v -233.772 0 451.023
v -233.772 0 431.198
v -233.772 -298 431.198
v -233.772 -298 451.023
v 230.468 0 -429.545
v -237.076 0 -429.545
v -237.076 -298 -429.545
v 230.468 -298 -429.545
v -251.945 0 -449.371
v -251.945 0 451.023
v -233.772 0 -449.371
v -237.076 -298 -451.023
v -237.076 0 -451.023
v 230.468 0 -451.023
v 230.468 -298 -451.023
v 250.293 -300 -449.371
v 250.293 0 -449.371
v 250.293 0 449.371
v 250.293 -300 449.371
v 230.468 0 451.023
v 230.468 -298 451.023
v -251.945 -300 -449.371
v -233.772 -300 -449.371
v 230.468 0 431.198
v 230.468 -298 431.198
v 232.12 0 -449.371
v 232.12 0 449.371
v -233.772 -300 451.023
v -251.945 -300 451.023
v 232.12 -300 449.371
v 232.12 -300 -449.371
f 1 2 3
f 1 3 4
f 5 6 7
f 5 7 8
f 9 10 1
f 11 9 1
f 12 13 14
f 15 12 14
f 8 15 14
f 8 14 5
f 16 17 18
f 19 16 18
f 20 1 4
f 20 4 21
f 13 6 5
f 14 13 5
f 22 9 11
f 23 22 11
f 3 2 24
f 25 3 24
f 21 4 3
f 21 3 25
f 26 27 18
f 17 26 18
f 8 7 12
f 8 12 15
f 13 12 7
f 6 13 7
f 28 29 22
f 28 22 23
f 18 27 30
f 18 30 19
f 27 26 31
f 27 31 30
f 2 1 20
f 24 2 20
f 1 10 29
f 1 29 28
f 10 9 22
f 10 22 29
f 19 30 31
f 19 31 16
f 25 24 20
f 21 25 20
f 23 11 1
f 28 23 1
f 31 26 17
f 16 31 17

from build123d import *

# Parameters (mm, degrees)
F0_W     = 18.173083
F0_H     = 900.393337
F0_W_2   = 18.173069
F0_H_2   = 898.741246
F1_DEPTH = 300
F2_W     = 464.239493
F2_H     = 19.82519
F2_W_2   = 467.543691
F2_H_2   = 21.477252
F3_DEPTH = 298


with BuildPart() as f1:
    # F0 (on Front) → F1 (new body)
    with BuildSketch(Plane.XZ):
        with Locations((-242.858387, 0.826046)):
            Rectangle(F0_W, F0_H)
        with Locations((241.206273, 0)):
            Rectangle(F0_W_2, F0_H_2)
    extrude(amount=F1_DEPTH)


with BuildPart() as f3:
    # F2 (on Front) → F3 (new body)
    with BuildSketch(Plane.XZ):
        with Locations((-1.652099, 441.110119)):
            Rectangle(F2_W, F2_H)
        with Locations((-3.304198, -440.284088)):
            Rectangle(F2_W_2, F2_H_2)
    extrude(amount=F3_DEPTH)


solid = Compound([f1.part, f3.part])
